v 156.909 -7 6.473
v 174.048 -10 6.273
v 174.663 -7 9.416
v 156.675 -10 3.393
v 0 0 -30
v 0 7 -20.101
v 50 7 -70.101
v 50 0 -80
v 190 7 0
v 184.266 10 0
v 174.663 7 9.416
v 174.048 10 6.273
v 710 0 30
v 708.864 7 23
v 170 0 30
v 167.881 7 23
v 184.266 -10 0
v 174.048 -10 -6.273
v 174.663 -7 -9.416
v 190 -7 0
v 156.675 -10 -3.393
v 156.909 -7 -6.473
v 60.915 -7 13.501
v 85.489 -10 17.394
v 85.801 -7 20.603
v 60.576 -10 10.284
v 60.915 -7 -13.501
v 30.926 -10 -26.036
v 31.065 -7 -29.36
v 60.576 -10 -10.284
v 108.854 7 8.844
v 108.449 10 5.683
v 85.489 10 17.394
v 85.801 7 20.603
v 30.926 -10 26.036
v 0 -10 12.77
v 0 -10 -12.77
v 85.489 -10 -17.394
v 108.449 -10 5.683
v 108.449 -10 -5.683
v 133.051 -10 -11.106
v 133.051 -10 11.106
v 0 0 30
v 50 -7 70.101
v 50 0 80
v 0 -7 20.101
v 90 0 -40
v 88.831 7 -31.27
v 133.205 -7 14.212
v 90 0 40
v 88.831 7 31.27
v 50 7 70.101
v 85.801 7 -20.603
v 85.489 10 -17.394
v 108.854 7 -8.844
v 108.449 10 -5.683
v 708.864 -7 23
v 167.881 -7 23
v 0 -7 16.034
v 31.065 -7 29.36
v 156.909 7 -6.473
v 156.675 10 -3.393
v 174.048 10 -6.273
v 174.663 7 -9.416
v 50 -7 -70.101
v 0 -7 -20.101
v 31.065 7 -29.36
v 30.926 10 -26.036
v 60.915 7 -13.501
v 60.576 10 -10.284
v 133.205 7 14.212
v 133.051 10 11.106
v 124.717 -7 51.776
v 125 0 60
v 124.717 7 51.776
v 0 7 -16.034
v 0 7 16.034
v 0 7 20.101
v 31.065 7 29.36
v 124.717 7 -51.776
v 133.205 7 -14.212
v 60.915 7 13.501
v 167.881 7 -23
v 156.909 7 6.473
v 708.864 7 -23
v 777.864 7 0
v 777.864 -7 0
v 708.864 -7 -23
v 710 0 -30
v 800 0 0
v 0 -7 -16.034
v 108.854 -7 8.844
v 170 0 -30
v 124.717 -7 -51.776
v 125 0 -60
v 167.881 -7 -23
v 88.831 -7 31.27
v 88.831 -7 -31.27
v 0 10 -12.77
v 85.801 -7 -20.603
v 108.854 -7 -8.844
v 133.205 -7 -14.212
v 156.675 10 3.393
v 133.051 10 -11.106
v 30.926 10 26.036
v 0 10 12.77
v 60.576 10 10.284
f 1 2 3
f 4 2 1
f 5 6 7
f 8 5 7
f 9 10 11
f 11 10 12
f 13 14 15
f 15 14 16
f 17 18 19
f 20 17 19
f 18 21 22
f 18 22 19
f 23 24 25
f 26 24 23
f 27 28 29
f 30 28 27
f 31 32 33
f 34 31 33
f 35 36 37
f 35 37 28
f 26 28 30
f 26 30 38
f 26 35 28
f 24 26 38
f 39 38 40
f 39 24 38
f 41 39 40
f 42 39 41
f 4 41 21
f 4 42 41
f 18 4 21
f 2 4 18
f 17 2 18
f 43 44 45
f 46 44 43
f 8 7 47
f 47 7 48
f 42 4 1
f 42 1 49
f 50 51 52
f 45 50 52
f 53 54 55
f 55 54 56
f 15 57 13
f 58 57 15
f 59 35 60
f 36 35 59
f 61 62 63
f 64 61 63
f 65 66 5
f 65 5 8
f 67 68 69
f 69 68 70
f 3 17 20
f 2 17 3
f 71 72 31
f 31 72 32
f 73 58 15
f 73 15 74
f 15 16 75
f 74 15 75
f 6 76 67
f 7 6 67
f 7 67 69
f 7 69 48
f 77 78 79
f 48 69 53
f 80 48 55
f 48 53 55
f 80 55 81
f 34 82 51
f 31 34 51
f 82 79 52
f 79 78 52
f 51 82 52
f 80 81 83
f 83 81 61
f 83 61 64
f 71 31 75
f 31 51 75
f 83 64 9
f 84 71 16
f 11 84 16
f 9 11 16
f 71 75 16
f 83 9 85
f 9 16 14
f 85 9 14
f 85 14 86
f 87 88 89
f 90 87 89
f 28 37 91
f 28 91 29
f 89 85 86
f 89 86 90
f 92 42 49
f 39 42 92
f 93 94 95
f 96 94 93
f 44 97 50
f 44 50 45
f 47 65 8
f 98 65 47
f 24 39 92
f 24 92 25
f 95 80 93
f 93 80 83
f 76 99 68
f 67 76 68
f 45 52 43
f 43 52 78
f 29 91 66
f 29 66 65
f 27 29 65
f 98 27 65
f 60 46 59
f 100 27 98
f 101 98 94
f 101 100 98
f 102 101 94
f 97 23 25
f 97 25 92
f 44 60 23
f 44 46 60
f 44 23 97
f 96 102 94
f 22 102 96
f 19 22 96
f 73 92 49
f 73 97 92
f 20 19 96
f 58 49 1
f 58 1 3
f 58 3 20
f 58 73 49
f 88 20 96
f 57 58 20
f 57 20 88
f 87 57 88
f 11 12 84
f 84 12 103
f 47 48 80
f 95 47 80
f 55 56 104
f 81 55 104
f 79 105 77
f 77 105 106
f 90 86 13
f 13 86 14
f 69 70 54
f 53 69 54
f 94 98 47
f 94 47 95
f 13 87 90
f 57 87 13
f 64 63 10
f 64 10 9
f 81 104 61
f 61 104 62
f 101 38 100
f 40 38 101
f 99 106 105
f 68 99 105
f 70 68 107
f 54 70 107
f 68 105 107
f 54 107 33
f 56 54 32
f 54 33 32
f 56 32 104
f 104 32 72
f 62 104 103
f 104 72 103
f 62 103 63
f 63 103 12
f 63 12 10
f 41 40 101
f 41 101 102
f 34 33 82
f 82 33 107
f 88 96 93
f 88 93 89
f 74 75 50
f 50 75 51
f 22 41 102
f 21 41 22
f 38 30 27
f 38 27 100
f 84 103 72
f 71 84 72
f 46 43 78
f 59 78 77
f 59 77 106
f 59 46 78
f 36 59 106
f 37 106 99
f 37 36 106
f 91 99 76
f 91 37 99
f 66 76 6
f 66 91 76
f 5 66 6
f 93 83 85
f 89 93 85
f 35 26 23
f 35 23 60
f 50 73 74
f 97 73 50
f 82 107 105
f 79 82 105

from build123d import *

# Parameters (mm, degrees)
F1_DEPTH = 7
F2_SIZE  = 6.99999
F4_DEPTH = 3
F5_SIZE  = 2.99999


# Not quite as in the source:
# - a fillet or chamfer is up to 0.001 mm smaller than in the source, because OpenCascade refuses the exact size


with BuildPart() as f1:
    # F0 (on Front) → F1 (new body)
    with BuildSketch(Plane.XZ):
        Polygon((0, 30), (0, 0), (800, 0), (710, 30), (170, 30), (125, 60), (90, 40), (50, 80), align=None)
        Polygon((800, 0), (0, 0), (0, -30), (50, -80), (90, -40), (125, -60), (170, -30), (710, -30), align=None)
    extrude(amount=F1_DEPTH)

    # F2 (size 7 in the source; OpenCascade refuses exactly that, so slightly less here)
    f2_edges = [f1.edges().sort_by_distance(p)[0] for p in [
        (25, -7, 55),
        (70, -7, 60),
        (107.5, -7, 50),
        (147.5, -7, 45),
        (440, -7, 30),
        (755, -7, 15),
        (25, -7, -55),
        (70, -7, -60),
        (107.5, -7, -50),
        (147.5, -7, -45),
        (440, -7, -30),
        (755, -7, -15),
    ]]
    chamfer(f2_edges, length=F2_SIZE)

    # F3 (on face) → F4 (join)
    with BuildSketch(Plane.XZ.offset(7)):
        Polygon((173.4544423223, -3.2363315113), (190, 0), (0, 0), (0, -16.0339120775), (30.4576978087, -14.7672765888), (60.9153956175, -13.5006411001), (84.8846249282, -11.1722019501), (108.853854239, -8.8437628001), (132.8813694417, -7.6582129113), (156.9088846445, -6.4726630226), align=None)
        Polygon((173.4544423223, 3.2363315113), (190, 0), (174.6631610562, 9.4158361321), align=None)
        Polygon((0, 0), (190, 0), (173.4544423223, 3.2363315113), (156.9088846445, 6.4726630226), (132.8813694417, 7.6582129113), (108.853854239, 8.8437628001), (84.8846249282, 11.1722019501), (60.9153956175, 13.5006411001), (30.4576978087, 14.7672765888), (0, 16.0339120775), align=None)
        Polygon((174.6631610562, -9.4158361321), (190, 0), (173.4544423223, -3.2363315113), align=None)
        Polygon((173.4544423223, 3.2363315113), (174.6631610562, 9.4158361321), (156.9088846445, 6.4726630226), align=None)
        Polygon((174.6631610562, -9.4158361321), (173.4544423223, -3.2363315113), (156.9088846445, -6.4726630226), align=None)
        Polygon((31.0645442111, 29.359591825), (0, 16.0339120775), (30.4576978087, 14.7672765888), align=None)
        Polygon((30.4576978087, -14.7672765888), (0, -16.0339120775), (31.0645442111, -29.359591825), align=None)
        Polygon((132.8813694417, 7.6582129113), (156.9088846445, 6.4726630226), (133.2047409049, 14.2119757014), align=None)
        Polygon((133.2047409049, -14.2119757014), (156.9088846445, -6.4726630226), (132.8813694417, -7.6582129113), align=None)
        Polygon((60.9153956175, 13.5006411001), (31.0645442111, 29.359591825), (30.4576978087, 14.7672765888), align=None)
        Polygon((30.4576978087, -14.7672765888), (31.0645442111, -29.359591825), (60.9153956175, -13.5006411001), align=None)
        Polygon((132.8813694417, 7.6582129113), (133.2047409049, 14.2119757014), (108.853854239, 8.8437628001), align=None)
        Polygon((108.853854239, -8.8437628001), (133.2047409049, -14.2119757014), (132.8813694417, -7.6582129113), align=None)
        Polygon((85.8007351026, 20.602748951), (60.9153956175, 13.5006411001), (84.8846249282, 11.1722019501), align=None)
        Polygon((84.8846249282, -11.1722019501), (60.9153956175, -13.5006411001), (85.8007351026, -20.602748951), align=None)
        Polygon((84.8846249282, 11.1722019501), (108.853854239, 8.8437628001), (85.8007351026, 20.602748951), align=None)
        Polygon((85.8007351026, -20.602748951), (108.853854239, -8.8437628001), (84.8846249282, -11.1722019501), align=None)
    extrude(amount=F4_DEPTH)

    # F5 (size 3 in the source; OpenCascade refuses exactly that, so slightly less here)
    f5_edges = [f1.edges().sort_by_distance(p)[0] for p in [
        (15.532272, -10, 22.696752),
        (45.98997, -10, 21.430116),
        (73.358065, -10, 17.051695),
        (97.327295, -10, 14.723256),
        (121.029298, -10, 11.527869),
        (145.056813, -10, 10.342319),
        (165.786023, -10, 7.94425),
        (182.331581, -10, 4.707918),
        (182.331581, -10, -4.707918),
        (165.786023, -10, -7.94425),
        (145.056813, -10, -10.342319),
        (121.029298, -10, -11.527869),
        (97.327295, -10, -14.723256),
        (73.358065, -10, -17.051695),
        (45.98997, -10, -21.430116),
        (15.532272, -10, -22.696752),
    ]]
    chamfer(f5_edges, length=F5_SIZE)

    # F6: F1 across plane


with BuildPart() as f1_1:
    add(f1.part)
    add(f1.part.mirror(Plane.XZ))


solid = f1_1.part
